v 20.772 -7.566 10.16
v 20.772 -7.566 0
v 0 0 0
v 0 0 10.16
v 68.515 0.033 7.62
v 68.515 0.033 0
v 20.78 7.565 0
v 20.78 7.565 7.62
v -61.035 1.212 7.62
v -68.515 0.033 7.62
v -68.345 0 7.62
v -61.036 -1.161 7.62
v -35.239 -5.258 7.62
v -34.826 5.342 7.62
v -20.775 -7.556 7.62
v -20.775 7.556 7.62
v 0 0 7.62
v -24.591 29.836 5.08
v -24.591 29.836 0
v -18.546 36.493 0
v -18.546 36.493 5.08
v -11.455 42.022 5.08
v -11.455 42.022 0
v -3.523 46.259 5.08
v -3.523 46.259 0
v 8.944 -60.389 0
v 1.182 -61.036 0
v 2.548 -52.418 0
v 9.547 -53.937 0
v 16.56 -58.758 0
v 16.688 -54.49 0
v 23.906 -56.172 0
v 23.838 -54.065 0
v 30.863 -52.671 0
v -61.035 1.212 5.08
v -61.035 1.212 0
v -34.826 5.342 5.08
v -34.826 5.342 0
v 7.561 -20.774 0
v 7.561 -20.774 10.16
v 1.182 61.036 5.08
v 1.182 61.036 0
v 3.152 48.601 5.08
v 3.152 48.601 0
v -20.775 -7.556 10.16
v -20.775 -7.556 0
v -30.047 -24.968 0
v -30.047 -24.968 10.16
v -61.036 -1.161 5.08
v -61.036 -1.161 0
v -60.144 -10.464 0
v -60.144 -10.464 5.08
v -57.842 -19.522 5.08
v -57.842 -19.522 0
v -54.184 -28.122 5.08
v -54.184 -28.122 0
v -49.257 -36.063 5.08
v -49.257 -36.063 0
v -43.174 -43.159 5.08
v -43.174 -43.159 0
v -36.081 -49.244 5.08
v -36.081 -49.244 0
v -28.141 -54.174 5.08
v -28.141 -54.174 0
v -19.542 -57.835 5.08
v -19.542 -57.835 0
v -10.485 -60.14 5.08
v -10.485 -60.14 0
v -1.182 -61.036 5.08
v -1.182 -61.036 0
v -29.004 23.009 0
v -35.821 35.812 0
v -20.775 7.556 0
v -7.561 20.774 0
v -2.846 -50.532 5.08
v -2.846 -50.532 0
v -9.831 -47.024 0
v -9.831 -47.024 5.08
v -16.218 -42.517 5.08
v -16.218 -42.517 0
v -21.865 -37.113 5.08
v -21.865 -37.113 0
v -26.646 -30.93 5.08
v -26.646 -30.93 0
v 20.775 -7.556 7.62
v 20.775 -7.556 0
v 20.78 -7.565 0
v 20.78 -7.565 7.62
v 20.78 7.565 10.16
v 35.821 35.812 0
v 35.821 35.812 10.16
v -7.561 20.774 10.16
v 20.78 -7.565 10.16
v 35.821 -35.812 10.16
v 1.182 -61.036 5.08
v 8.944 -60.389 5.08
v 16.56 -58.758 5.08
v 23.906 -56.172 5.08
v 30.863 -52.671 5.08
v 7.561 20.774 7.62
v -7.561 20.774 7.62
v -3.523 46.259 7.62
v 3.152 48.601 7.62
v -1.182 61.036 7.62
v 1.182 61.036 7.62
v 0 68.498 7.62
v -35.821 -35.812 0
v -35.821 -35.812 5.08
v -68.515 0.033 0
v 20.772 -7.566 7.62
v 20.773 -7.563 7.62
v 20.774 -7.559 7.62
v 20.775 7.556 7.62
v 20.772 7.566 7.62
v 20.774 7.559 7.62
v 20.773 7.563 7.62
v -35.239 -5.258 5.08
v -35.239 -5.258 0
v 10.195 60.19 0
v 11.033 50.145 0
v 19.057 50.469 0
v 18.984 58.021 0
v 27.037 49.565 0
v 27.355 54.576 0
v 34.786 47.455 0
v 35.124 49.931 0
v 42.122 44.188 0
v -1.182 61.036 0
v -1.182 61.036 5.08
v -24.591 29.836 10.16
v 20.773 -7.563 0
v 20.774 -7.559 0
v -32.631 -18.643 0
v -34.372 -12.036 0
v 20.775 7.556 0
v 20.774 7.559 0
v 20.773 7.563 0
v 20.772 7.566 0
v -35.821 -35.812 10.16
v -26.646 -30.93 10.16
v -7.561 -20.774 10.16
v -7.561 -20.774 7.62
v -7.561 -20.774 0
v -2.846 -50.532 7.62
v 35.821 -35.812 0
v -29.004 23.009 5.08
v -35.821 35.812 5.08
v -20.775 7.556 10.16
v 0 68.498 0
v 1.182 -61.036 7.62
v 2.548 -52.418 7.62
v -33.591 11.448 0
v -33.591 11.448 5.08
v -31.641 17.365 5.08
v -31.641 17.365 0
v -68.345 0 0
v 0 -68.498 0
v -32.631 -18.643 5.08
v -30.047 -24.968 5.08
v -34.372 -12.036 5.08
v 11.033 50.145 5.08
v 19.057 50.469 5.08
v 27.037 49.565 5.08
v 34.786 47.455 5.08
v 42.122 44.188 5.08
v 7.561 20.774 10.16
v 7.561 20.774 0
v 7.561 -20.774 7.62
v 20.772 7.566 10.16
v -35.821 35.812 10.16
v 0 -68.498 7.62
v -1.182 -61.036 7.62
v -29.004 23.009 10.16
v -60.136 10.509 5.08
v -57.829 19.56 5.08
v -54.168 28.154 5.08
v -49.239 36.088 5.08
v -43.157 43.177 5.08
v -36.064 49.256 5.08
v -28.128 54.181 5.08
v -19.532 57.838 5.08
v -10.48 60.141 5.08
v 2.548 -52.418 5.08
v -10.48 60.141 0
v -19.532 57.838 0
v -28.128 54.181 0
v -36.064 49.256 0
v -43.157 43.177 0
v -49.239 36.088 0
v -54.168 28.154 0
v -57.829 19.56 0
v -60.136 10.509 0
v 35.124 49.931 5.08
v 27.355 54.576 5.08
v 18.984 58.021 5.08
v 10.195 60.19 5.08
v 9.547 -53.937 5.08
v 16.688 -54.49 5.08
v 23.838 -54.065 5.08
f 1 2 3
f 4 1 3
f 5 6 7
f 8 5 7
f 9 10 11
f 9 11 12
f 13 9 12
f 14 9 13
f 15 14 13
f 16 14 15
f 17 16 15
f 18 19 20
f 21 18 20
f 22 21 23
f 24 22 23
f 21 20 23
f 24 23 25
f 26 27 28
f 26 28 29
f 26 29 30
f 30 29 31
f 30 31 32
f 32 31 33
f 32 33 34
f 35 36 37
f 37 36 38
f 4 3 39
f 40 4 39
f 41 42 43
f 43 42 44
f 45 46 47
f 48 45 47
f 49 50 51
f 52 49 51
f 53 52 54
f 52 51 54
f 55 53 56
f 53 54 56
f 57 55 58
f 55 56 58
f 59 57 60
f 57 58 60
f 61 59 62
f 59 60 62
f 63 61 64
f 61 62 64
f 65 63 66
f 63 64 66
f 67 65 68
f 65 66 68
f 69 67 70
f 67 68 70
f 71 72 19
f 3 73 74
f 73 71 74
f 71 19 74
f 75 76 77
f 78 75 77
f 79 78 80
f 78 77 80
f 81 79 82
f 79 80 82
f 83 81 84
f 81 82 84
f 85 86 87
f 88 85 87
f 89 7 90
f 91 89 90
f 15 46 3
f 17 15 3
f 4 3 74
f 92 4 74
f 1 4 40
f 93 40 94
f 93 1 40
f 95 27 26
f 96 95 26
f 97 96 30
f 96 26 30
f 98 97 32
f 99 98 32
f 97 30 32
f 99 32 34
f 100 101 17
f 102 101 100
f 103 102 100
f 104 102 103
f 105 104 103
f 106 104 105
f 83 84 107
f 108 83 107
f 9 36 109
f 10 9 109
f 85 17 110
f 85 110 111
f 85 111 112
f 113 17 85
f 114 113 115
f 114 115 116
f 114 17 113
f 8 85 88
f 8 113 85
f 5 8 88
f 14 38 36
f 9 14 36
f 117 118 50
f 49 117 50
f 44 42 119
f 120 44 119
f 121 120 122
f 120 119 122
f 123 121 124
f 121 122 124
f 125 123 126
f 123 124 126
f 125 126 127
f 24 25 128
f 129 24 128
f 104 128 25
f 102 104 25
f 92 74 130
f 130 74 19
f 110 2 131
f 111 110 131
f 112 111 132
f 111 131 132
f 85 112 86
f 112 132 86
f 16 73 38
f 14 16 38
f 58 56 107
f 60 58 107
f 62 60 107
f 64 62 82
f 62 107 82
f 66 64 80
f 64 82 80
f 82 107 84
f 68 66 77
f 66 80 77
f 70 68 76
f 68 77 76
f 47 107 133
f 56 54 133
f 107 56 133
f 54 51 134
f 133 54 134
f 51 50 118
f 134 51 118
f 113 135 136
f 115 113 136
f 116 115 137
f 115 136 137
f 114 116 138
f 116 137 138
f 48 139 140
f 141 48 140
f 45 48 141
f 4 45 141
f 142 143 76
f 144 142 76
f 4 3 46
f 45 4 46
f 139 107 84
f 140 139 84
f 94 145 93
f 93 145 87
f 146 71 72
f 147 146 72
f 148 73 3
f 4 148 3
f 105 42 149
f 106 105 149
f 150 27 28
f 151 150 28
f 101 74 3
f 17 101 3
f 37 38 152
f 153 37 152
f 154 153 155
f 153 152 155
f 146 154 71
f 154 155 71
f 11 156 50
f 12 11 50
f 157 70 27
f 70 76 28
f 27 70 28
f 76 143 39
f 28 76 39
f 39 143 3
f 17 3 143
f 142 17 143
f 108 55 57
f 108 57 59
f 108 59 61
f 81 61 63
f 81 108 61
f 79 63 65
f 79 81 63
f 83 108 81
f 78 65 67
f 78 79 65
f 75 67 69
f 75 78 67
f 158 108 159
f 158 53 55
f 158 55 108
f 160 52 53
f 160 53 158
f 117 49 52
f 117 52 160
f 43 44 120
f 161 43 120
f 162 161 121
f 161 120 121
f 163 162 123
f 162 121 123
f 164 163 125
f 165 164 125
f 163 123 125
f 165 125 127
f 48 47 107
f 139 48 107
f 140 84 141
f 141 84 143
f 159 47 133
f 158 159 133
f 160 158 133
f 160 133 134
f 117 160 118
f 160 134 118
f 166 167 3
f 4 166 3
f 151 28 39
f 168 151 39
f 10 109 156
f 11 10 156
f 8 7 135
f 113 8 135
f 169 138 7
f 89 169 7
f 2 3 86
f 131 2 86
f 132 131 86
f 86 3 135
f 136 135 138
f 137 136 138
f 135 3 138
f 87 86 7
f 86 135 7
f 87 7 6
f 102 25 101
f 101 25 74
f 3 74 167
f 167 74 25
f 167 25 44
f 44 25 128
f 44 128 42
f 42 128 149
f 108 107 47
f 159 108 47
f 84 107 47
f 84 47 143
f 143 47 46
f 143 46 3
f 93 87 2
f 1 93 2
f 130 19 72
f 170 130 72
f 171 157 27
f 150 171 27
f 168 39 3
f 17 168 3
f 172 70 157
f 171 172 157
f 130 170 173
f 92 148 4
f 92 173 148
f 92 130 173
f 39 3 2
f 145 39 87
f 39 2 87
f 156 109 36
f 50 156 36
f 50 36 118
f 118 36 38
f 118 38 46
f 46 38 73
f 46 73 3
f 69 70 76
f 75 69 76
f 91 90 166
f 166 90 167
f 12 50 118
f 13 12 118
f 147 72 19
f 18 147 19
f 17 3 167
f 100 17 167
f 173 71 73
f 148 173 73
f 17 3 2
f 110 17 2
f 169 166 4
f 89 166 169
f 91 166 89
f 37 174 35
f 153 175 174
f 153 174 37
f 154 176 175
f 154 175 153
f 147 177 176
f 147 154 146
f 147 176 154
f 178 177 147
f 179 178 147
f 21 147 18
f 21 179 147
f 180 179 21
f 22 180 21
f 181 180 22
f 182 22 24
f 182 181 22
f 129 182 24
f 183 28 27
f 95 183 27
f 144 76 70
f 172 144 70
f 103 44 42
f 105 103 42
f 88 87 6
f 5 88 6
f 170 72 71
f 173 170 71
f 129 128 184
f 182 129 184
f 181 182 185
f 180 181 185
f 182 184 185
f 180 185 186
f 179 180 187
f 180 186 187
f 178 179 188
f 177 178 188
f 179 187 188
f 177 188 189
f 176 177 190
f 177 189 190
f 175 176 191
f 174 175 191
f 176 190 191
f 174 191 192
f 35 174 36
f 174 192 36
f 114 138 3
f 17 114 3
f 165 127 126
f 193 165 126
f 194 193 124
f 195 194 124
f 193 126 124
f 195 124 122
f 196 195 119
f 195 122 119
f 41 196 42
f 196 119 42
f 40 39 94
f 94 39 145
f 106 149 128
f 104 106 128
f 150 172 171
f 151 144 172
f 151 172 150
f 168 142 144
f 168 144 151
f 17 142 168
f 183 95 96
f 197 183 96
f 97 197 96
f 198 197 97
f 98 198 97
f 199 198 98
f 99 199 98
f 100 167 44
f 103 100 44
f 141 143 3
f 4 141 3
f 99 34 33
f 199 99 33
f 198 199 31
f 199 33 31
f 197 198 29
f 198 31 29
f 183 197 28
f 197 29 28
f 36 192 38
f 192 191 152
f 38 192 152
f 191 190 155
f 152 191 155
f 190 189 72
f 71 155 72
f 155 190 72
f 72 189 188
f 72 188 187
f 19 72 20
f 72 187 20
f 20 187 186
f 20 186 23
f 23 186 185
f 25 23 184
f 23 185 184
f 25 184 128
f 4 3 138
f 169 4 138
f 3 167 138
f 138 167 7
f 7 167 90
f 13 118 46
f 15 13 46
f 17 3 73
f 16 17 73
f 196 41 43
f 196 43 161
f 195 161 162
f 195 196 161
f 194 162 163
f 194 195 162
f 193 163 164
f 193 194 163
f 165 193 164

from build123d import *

# Parameters (mm, degrees)
F1_DEPTH = 5.08
F2_DEPTH = 7.62
F3_DEPTH = 10.16


with BuildPart() as f1:
    # F0 (on Top) → F1 (new body)
    with BuildSketch(Plane.XY):
        with BuildLine():
            Line((1.18219, 61.035888), (3.152259, 48.600974))
            ThreePointArc((3.152259, 48.600974), (23.064598, 50.169934), (42.121717, 44.187535))
            ThreePointArc((42.121717, 44.187535), (23.233033, 56.453551), (1.18219, 61.035888))
        make_face()
        with BuildLine():
            ThreePointArc((-24.590611, 29.835868), (-15.118994, 39.40957), (-3.523368, 46.258566))
            Line((-3.523368, 46.258566), (-1.18219, 61.035888))
            ThreePointArc((-1.18219, 61.035888), (-43.156571, 43.177397), (-61.035311, 1.211636))
            Line((-61.035311, 1.211636), (-34.825747, 5.34172))
            ThreePointArc((-34.825747, 5.34172), (-32.703679, 14.435437), (-29.004045, 23.009326))
            Line((-29.004045, 23.009326), (-35.821182, 35.812188))
            Line((-35.821182, 35.812188), (-24.590611, 29.835868))
        make_face()
        with BuildLine():
            Line((-1.18219, -61.035888), (-2.846392, -50.531581))
            ThreePointArc((-2.846392, -50.531581), (-16.217942, -42.517415), (-26.646494, -30.929901))
            Line((-26.646494, -30.929901), (-35.821182, -35.812188))
            Line((-35.821182, -35.812188), (-30.047039, -24.968111))
            ThreePointArc((-30.047039, -24.968111), (-33.608865, -15.367662), (-35.239255, -5.258406))
            Line((-35.239255, -5.258406), (-61.036296, -1.16095))
            ThreePointArc((-61.036296, -1.16095), (-43.174495, -43.159474), (-1.18219, -61.035888))
        make_face()
        with BuildLine():
            ThreePointArc((30.863305, -52.670994), (16.688034, -54.48978), (2.547504, -52.41814))
            Line((2.547504, -52.41814), (1.18219, -61.035888))
            ThreePointArc((1.18219, -61.035888), (16.559629, -58.758454), (30.863305, -52.670994))
        make_face()
    extrude(amount=F1_DEPTH)


with BuildPart() as f2:
    # F0 (on Top) → F2 (new body)
    with BuildSketch(Plane.XY):
        Polygon((-20.775483, -7.55575), (0, 0), (-20.775483, 7.55575), (-34.825747, 5.34172), (-61.035311, 1.211636), (-68.514972, 0.032997), (-68.345484, 0), (-61.036296, -1.16095), (-35.239255, -5.258406), align=None)
        Polygon((-7.560967, 20.773586), (0, 0), (7.560967, 20.773586), (3.152259, 48.600974), (1.18219, 61.035888), (0, 68.49777), (-1.18219, 61.035888), (-3.523368, 46.258566), align=None)
        with BuildLine():
            Line((20.780308, -7.564811), (68.514972, 0.032997))
            Line((68.514972, 0.032997), (20.780314, 7.564822))
            Line((20.780314, 7.564822), (20.775483, 7.55575))
            ThreePointArc((20.775483, 7.55575), (20.773586, 7.560967), (20.771686, 7.566183))
            Line((20.771686, 7.566183), (0, 0))
            Line((0, 0), (20.771686, -7.566183))
            ThreePointArc((20.771686, -7.566183), (20.773586, -7.560967), (20.775483, -7.55575))
            Line((20.775483, -7.55575), (20.780308, -7.564811))
        make_face()
        Polygon((7.560967, -20.773586), (0, 0), (-7.560967, -20.773586), (-2.846392, -50.531581), (-1.18219, -61.035888), (0, -68.49777), (1.18219, -61.035888), (2.547504, -52.41814), align=None)
    extrude(amount=F2_DEPTH)


with BuildPart() as f3:
    # F0 (on Top) → F3 (new body)
    with BuildSketch(Plane.XY):
        Polygon((-20.775483, 7.55575), (0, 0), (-7.560967, 20.773586), (-24.590611, 29.835868), (-35.821182, 35.812188), (-29.004045, 23.009326), align=None)
        Polygon((20.771686, 7.566183), (20.780314, 7.564822), (35.821182, 35.812188), (7.560967, 20.773586), (0, 0), align=None)
        Polygon((35.821182, -35.812188), (20.780308, -7.564811), (20.771686, -7.566183), (0, 0), (7.560967, -20.773586), align=None)
        Polygon((-7.560967, -20.773586), (0, 0), (-20.775483, -7.55575), (-30.047039, -24.968111), (-35.821182, -35.812188), (-26.646494, -30.929901), align=None)
    extrude(amount=F3_DEPTH)


solid = Compound([f1.part, f2.part, f3.part])
